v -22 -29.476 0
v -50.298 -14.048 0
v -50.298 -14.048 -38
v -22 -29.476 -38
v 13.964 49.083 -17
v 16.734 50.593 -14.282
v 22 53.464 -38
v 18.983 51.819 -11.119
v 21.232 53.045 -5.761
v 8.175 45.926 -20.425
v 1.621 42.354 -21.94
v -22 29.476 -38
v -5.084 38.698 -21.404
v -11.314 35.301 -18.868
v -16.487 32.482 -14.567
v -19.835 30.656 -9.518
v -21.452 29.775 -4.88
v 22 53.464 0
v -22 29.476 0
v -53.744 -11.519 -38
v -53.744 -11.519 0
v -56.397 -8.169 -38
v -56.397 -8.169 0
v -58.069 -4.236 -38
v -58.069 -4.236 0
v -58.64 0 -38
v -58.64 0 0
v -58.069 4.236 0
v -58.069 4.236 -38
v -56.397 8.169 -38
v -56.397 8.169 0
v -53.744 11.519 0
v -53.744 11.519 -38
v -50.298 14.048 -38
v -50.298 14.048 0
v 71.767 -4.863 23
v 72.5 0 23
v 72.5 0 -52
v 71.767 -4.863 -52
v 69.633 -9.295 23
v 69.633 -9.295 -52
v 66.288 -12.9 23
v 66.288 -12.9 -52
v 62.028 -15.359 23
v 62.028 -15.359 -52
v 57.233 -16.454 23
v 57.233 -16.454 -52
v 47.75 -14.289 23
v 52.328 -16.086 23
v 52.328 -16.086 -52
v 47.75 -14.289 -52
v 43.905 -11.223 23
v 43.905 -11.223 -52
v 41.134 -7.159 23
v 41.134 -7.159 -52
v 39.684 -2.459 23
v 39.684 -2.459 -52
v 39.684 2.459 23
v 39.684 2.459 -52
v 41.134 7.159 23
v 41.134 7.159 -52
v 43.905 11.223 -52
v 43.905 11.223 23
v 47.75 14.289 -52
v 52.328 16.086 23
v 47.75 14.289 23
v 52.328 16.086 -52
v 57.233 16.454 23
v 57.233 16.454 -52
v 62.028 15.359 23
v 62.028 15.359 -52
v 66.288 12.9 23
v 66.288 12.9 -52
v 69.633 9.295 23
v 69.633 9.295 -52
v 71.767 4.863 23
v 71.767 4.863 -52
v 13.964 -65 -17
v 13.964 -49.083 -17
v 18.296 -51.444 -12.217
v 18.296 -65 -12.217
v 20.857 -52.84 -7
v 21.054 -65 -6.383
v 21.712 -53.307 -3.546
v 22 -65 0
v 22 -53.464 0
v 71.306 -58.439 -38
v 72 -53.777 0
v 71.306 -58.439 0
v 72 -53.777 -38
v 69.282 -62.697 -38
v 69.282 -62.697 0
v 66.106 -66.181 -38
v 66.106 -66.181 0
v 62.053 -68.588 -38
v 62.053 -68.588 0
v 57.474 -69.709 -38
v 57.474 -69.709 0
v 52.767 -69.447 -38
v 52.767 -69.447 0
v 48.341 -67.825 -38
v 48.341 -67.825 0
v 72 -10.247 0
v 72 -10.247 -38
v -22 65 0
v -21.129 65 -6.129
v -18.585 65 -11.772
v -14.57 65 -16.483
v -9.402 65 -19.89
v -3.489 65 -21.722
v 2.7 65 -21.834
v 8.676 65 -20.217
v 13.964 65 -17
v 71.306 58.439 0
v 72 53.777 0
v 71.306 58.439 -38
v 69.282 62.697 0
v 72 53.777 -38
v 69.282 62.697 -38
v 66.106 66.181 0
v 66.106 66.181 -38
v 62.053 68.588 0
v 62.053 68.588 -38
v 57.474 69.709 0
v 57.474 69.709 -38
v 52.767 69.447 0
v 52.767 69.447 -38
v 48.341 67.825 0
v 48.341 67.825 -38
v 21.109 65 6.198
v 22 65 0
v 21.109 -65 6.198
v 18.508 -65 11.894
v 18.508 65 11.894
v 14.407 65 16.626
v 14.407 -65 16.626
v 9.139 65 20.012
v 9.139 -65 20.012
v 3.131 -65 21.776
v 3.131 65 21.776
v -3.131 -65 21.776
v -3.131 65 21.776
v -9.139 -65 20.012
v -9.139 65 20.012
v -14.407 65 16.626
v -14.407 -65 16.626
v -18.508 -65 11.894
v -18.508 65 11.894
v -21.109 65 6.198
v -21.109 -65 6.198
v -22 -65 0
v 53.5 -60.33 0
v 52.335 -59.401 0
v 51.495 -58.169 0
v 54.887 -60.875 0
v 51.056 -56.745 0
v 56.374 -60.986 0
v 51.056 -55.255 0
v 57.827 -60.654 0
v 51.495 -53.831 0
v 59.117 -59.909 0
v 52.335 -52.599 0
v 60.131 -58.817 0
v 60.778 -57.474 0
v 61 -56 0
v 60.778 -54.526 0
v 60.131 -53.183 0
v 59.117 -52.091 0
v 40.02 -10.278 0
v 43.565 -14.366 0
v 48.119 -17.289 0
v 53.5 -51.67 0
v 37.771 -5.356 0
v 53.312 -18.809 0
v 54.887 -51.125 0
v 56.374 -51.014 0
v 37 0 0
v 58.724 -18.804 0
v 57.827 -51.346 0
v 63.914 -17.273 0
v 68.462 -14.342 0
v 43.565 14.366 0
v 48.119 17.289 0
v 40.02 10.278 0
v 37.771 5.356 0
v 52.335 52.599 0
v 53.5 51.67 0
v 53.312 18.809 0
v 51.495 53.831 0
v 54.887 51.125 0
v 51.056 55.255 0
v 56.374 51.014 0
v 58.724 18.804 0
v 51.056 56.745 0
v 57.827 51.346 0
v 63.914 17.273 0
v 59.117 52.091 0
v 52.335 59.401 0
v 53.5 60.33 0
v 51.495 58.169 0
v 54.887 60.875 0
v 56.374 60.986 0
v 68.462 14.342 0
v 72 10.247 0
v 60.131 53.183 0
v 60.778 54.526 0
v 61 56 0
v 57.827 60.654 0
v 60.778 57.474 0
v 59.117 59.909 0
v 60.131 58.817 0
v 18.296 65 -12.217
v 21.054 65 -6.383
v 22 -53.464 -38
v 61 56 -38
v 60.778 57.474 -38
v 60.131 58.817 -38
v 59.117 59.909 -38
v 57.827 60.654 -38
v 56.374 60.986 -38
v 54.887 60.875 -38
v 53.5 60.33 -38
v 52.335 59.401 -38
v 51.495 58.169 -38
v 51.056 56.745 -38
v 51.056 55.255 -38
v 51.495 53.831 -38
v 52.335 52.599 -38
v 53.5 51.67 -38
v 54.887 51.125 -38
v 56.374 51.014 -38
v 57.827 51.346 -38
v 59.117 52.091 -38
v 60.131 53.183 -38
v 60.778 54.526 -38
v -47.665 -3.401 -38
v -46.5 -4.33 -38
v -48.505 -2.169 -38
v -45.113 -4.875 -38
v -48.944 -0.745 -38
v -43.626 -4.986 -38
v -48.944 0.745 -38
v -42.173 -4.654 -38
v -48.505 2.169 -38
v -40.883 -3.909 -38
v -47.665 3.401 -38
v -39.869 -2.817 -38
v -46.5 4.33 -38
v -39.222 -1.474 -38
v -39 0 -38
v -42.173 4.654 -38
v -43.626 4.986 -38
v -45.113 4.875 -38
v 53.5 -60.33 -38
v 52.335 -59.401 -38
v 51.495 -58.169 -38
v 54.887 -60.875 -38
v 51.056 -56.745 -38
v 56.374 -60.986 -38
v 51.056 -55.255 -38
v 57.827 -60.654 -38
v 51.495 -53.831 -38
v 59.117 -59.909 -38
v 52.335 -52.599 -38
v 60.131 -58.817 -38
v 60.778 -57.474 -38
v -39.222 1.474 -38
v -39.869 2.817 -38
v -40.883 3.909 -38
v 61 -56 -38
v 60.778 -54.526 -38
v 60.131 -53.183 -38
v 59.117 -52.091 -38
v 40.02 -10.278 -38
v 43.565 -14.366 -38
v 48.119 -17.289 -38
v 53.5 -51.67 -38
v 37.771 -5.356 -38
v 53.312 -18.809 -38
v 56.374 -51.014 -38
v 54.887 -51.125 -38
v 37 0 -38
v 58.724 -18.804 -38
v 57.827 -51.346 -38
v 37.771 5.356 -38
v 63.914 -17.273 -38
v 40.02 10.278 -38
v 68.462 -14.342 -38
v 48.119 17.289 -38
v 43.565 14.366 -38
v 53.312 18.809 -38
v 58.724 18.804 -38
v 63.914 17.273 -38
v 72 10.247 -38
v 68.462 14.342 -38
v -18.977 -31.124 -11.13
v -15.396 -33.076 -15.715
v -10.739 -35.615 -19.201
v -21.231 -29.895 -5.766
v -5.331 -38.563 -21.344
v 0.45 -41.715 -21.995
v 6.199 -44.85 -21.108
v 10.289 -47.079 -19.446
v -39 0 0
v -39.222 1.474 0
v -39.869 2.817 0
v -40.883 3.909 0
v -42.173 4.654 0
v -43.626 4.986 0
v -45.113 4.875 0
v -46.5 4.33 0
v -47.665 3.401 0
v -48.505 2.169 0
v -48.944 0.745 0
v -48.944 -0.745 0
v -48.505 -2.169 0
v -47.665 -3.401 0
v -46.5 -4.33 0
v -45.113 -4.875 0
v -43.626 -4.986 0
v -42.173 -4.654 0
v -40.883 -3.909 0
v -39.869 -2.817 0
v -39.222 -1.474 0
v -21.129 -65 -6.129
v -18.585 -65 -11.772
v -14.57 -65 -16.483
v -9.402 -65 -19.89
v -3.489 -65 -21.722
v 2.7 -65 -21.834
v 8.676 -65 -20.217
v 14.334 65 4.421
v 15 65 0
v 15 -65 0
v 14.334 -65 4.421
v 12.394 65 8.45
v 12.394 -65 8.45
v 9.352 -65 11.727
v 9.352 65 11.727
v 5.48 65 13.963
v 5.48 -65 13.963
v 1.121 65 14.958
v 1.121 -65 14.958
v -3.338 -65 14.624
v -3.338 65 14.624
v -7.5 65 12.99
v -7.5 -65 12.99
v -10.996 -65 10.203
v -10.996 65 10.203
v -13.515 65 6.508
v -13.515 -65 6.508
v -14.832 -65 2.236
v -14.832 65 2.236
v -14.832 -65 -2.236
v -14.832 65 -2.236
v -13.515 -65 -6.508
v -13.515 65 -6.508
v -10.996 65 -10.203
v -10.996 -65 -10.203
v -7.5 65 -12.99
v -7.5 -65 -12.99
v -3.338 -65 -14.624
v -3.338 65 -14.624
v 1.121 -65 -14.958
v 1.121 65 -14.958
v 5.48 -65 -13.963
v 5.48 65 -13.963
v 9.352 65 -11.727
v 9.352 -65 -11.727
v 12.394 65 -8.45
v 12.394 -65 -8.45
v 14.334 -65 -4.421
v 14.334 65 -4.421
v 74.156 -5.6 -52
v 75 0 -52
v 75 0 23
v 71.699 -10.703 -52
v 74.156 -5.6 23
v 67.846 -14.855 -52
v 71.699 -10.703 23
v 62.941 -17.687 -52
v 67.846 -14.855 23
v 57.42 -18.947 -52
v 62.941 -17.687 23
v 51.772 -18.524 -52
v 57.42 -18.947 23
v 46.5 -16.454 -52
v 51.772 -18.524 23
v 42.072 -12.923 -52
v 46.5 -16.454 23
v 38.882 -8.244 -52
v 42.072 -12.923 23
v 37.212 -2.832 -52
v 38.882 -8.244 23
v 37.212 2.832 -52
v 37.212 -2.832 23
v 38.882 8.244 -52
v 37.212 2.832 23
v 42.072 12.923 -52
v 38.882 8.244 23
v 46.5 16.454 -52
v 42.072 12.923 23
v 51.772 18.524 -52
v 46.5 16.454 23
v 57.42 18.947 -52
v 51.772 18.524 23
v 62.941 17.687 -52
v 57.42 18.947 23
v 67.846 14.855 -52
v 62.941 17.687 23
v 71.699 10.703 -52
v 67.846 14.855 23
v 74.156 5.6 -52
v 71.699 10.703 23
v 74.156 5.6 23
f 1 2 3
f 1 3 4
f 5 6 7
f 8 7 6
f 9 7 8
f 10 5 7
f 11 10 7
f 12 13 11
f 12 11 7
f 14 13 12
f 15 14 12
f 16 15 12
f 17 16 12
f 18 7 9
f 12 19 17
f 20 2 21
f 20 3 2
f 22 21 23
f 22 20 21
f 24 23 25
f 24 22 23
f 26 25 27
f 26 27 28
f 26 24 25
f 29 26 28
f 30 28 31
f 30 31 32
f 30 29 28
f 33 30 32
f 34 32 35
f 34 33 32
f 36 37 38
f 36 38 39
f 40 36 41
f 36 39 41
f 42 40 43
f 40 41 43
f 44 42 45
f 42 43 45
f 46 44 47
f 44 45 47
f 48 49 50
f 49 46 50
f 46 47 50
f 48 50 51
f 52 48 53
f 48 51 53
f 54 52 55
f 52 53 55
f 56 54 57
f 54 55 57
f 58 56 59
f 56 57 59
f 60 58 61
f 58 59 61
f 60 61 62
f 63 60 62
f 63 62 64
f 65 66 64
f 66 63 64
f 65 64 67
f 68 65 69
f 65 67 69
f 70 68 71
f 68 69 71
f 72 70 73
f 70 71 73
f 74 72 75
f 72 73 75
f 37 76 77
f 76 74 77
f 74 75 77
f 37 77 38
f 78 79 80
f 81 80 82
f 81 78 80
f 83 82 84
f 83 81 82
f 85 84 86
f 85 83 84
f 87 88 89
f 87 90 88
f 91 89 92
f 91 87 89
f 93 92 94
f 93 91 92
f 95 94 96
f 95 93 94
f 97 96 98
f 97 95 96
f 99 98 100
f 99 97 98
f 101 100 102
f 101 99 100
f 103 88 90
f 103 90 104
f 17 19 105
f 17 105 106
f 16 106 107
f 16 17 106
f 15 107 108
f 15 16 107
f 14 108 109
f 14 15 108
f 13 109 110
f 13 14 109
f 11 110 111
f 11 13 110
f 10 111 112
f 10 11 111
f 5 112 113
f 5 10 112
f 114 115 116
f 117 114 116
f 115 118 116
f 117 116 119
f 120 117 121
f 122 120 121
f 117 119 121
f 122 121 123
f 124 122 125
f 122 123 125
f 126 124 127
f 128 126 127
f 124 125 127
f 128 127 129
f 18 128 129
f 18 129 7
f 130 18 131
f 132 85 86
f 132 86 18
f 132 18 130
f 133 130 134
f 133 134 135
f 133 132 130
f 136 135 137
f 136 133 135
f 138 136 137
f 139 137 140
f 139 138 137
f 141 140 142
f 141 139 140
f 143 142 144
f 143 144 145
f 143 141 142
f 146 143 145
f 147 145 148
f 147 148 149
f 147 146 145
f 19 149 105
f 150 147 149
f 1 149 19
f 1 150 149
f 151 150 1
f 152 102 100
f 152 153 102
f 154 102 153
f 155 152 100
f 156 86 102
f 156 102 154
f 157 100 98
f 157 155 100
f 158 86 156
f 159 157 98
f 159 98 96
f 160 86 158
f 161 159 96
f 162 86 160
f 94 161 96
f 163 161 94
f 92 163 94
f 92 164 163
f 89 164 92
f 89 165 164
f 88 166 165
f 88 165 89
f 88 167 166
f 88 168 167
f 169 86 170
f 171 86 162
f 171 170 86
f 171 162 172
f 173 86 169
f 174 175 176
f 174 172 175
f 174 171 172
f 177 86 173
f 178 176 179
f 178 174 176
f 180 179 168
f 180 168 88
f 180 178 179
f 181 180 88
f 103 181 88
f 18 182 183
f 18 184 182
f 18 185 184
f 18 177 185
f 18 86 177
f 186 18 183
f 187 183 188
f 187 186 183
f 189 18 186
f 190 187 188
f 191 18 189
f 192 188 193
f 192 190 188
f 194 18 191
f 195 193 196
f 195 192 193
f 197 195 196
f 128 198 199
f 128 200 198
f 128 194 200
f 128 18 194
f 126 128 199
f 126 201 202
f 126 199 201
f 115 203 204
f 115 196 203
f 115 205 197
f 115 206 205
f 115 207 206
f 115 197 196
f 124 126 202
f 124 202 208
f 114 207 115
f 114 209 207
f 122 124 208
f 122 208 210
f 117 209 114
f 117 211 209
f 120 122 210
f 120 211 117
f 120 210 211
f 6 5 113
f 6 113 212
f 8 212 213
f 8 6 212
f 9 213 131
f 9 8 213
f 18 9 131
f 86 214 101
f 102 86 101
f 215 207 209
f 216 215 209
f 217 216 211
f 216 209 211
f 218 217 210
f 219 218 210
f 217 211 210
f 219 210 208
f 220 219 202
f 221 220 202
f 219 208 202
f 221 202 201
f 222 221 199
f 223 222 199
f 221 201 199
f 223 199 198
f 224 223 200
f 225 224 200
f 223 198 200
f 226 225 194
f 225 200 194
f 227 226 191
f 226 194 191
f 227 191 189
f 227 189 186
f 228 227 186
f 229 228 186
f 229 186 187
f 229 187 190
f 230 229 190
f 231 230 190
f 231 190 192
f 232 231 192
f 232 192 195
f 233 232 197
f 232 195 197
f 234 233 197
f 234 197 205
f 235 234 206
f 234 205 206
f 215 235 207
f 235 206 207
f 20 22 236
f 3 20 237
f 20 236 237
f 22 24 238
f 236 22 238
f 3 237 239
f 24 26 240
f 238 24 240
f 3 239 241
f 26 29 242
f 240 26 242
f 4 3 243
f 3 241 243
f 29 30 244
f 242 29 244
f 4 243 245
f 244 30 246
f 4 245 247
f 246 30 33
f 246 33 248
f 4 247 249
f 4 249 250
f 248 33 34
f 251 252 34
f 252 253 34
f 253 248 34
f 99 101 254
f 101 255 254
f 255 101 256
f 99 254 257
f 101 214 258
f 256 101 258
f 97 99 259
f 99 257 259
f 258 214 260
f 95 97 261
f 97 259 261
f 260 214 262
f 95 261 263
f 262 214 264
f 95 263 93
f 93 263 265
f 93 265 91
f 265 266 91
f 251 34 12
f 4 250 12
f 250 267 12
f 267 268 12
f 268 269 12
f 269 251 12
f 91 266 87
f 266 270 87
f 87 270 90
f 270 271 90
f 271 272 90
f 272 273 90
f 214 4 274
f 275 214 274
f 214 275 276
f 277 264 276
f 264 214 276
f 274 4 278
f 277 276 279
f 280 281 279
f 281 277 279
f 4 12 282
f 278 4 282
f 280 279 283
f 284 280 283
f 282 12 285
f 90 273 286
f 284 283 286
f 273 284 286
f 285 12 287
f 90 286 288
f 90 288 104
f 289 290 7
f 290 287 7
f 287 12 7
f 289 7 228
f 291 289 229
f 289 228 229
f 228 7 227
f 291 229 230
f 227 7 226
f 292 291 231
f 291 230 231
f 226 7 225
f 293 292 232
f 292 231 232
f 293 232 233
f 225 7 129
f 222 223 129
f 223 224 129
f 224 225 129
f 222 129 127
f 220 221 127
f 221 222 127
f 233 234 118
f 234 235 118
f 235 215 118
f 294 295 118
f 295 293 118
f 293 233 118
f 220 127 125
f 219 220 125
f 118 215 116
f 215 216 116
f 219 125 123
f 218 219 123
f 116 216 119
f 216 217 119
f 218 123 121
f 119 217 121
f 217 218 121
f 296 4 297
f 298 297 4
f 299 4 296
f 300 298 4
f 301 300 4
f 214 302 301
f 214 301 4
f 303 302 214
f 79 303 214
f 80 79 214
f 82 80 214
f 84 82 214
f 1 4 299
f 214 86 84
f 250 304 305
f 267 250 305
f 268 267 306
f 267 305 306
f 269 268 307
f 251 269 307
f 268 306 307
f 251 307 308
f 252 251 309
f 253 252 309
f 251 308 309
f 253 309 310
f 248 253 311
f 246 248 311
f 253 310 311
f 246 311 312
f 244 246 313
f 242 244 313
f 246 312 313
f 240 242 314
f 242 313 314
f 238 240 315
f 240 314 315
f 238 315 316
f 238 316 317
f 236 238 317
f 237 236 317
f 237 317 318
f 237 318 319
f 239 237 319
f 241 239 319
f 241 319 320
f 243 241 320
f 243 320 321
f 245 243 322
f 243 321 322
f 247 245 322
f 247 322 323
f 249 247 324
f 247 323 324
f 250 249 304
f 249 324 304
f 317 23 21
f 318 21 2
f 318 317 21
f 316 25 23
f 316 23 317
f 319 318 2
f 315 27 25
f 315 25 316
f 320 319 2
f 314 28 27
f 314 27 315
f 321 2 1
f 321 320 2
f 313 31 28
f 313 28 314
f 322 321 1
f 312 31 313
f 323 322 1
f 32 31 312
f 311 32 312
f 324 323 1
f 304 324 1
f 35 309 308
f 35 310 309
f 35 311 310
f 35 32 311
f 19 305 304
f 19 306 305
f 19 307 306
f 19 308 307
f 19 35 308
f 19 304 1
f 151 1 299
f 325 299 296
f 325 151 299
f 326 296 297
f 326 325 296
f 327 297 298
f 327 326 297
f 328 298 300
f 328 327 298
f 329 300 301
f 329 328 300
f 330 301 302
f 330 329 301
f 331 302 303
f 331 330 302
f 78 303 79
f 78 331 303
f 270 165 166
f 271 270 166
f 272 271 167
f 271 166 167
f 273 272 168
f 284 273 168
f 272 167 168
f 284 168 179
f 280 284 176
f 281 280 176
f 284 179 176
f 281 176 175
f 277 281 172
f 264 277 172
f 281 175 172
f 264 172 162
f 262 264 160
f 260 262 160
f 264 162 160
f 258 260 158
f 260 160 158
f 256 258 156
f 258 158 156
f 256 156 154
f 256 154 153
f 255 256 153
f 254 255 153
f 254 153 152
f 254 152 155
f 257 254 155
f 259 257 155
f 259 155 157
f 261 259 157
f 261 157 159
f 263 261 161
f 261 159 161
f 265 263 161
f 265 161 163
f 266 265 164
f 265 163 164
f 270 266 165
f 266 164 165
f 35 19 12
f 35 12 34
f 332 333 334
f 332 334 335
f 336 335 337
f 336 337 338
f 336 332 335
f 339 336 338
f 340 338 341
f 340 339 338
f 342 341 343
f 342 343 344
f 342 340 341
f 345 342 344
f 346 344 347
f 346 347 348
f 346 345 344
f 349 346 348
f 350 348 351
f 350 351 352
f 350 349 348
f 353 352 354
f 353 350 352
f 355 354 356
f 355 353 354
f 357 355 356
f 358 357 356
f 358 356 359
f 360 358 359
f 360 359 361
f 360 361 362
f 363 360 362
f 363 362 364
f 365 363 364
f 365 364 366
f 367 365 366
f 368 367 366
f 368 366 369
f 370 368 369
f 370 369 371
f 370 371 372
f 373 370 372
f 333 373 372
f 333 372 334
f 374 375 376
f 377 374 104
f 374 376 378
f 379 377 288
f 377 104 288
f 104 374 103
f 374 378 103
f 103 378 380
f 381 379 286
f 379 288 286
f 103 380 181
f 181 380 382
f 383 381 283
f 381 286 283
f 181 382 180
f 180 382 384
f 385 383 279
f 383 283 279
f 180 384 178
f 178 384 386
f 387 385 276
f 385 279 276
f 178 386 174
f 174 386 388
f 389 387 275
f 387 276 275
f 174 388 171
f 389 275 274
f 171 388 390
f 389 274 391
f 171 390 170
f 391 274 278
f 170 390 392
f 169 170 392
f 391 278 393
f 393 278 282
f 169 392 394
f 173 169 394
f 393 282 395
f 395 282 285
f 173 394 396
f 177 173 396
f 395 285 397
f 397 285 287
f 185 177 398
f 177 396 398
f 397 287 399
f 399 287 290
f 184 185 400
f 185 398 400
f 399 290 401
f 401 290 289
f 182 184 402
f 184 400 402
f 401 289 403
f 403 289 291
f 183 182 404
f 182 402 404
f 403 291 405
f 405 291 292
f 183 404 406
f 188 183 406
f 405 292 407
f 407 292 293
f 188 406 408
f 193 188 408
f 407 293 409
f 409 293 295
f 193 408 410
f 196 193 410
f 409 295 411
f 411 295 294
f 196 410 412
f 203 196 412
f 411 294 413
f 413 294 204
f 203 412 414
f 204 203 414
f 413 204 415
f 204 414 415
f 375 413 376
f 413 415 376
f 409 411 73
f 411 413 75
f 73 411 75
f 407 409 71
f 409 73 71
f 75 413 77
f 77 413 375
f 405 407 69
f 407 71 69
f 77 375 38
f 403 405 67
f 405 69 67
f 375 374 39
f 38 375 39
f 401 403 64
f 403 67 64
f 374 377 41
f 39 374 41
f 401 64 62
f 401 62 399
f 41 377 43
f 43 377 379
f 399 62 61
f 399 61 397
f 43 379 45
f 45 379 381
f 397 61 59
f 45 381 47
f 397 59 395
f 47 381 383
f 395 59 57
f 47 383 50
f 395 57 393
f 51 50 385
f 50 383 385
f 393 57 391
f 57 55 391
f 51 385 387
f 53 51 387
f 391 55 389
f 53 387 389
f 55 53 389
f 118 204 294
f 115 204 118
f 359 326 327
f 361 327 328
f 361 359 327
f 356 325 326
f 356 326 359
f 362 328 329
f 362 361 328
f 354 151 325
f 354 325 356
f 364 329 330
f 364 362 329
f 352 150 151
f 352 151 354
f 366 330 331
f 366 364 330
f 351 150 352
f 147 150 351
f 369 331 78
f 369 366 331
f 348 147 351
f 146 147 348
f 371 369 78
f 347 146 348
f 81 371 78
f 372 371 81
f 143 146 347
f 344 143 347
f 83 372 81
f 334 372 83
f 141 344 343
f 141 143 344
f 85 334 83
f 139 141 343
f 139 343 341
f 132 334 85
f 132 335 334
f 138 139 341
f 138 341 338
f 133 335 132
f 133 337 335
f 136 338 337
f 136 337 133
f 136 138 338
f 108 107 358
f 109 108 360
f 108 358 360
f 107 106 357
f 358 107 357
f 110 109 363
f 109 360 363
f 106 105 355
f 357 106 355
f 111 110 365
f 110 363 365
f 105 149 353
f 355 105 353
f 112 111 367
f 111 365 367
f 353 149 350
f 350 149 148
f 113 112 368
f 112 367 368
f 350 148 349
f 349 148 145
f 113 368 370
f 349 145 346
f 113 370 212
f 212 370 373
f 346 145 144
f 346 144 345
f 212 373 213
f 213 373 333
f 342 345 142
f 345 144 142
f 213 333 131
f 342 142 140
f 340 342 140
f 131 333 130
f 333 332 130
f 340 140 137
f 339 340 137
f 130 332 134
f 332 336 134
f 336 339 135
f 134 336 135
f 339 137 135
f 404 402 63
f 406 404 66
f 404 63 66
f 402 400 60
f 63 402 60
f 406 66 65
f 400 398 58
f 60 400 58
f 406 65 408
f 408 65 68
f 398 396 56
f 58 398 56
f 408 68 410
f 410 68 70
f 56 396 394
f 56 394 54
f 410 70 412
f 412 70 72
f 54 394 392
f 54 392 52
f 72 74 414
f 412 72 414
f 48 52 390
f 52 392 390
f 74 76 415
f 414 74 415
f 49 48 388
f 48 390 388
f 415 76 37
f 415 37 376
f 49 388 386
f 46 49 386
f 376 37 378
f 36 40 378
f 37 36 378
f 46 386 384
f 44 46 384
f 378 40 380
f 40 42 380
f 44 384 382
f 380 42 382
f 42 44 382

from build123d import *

# Parameters (mm, degrees)
F1_R     = 5
F3_DEPTH = 38
F0_R     = 15
F4_DEPTH = 65
F5_DEPTH = 65
F6_DEPTH = 65
F7_R     = 16


with BuildPart() as f2:
    # F0 (on Front) → F2 (revolve)
    with BuildSketch(Plane.XZ):
        Polygon((75, 23), (72.5, 23), (72.5, -17), (72.5, -38), (72.5, -52), (75, -52), align=None)
    revolve(axis=Axis((56, 0, -14.5), (0, 0, -1)))

    # F1 (on Top) → F3 (join)
    with BuildSketch(Plane.XY):
        Polygon((-22, -29.475761), (-22, 29.475761), (-76.065856, 0), align=None)
        with Locations((-44, 0)):
            Circle(F1_R, mode=Mode.SUBTRACT)
        Polygon((22, -53.463793), (22, 53.463793), (-22, 29.475761), (-22, -29.475761), align=None)
        with BuildLine():
            ThreePointArc((72, -4.031129), (39.5, 0), (72, 4.031129))
            Line((72, 4.031129), (72, 80.722921))
            Line((72, 80.722921), (22, 53.463793))
            Line((22, 53.463793), (22, -53.463793))
            Line((22, -53.463793), (72, -80.722921))
            Line((72, -80.722921), (72, -4.031129))
        make_face()
        with Locations((56, -56)):
            Circle(F1_R, mode=Mode.SUBTRACT)
        with Locations((56, 56)):
            Circle(F1_R, mode=Mode.SUBTRACT)
    extrude(amount=-F3_DEPTH)

    # F0 (on Front) → F4 (cut, symmetric)
    with BuildSketch(Plane.XZ):
        Circle(F0_R)
    extrude(amount=F4_DEPTH, both=True, mode=Mode.SUBTRACT)

    # F0 (on Front) → F5 (join, symmetric)
    with BuildSketch(Plane.XZ):
        with BuildLine():
            ThreePointArc((13.96424, -17), (19.889863, -9.401774), (22, 0))
            ThreePointArc((22, 0), (0, 22), (-22, 0))
            ThreePointArc((-22, 0), (-9.401774, -19.889863), (13.96424, -17))
        make_face()
        Circle(F0_R, mode=Mode.SUBTRACT)
    extrude(amount=F5_DEPTH, both=True)

    # F1 (on Top) → F6 (cut, symmetric)
    with BuildSketch(Plane.XY):
        with BuildLine():
            ThreePointArc((72, -4.031129), (72.374523, -2.03101), (72.5, 0))
            ThreePointArc((72.5, 0), (72.374523, 2.03101), (72, 4.031129))
            Line((72, 4.031129), (72, 0))
            Line((72, 0), (72, -4.031129))
        make_face()
    extrude(amount=F6_DEPTH, both=True, mode=Mode.SUBTRACT)

    # F7
    f7_edges = [f2.edges().sort_by_distance(p)[0] for p in [
        (-76.065856, 0, -19),
        (72, -80.722921, -19),
        (72, 80.722921, -19),
    ]]
    fillet(f7_edges, radius=F7_R)


solid = f2.part
